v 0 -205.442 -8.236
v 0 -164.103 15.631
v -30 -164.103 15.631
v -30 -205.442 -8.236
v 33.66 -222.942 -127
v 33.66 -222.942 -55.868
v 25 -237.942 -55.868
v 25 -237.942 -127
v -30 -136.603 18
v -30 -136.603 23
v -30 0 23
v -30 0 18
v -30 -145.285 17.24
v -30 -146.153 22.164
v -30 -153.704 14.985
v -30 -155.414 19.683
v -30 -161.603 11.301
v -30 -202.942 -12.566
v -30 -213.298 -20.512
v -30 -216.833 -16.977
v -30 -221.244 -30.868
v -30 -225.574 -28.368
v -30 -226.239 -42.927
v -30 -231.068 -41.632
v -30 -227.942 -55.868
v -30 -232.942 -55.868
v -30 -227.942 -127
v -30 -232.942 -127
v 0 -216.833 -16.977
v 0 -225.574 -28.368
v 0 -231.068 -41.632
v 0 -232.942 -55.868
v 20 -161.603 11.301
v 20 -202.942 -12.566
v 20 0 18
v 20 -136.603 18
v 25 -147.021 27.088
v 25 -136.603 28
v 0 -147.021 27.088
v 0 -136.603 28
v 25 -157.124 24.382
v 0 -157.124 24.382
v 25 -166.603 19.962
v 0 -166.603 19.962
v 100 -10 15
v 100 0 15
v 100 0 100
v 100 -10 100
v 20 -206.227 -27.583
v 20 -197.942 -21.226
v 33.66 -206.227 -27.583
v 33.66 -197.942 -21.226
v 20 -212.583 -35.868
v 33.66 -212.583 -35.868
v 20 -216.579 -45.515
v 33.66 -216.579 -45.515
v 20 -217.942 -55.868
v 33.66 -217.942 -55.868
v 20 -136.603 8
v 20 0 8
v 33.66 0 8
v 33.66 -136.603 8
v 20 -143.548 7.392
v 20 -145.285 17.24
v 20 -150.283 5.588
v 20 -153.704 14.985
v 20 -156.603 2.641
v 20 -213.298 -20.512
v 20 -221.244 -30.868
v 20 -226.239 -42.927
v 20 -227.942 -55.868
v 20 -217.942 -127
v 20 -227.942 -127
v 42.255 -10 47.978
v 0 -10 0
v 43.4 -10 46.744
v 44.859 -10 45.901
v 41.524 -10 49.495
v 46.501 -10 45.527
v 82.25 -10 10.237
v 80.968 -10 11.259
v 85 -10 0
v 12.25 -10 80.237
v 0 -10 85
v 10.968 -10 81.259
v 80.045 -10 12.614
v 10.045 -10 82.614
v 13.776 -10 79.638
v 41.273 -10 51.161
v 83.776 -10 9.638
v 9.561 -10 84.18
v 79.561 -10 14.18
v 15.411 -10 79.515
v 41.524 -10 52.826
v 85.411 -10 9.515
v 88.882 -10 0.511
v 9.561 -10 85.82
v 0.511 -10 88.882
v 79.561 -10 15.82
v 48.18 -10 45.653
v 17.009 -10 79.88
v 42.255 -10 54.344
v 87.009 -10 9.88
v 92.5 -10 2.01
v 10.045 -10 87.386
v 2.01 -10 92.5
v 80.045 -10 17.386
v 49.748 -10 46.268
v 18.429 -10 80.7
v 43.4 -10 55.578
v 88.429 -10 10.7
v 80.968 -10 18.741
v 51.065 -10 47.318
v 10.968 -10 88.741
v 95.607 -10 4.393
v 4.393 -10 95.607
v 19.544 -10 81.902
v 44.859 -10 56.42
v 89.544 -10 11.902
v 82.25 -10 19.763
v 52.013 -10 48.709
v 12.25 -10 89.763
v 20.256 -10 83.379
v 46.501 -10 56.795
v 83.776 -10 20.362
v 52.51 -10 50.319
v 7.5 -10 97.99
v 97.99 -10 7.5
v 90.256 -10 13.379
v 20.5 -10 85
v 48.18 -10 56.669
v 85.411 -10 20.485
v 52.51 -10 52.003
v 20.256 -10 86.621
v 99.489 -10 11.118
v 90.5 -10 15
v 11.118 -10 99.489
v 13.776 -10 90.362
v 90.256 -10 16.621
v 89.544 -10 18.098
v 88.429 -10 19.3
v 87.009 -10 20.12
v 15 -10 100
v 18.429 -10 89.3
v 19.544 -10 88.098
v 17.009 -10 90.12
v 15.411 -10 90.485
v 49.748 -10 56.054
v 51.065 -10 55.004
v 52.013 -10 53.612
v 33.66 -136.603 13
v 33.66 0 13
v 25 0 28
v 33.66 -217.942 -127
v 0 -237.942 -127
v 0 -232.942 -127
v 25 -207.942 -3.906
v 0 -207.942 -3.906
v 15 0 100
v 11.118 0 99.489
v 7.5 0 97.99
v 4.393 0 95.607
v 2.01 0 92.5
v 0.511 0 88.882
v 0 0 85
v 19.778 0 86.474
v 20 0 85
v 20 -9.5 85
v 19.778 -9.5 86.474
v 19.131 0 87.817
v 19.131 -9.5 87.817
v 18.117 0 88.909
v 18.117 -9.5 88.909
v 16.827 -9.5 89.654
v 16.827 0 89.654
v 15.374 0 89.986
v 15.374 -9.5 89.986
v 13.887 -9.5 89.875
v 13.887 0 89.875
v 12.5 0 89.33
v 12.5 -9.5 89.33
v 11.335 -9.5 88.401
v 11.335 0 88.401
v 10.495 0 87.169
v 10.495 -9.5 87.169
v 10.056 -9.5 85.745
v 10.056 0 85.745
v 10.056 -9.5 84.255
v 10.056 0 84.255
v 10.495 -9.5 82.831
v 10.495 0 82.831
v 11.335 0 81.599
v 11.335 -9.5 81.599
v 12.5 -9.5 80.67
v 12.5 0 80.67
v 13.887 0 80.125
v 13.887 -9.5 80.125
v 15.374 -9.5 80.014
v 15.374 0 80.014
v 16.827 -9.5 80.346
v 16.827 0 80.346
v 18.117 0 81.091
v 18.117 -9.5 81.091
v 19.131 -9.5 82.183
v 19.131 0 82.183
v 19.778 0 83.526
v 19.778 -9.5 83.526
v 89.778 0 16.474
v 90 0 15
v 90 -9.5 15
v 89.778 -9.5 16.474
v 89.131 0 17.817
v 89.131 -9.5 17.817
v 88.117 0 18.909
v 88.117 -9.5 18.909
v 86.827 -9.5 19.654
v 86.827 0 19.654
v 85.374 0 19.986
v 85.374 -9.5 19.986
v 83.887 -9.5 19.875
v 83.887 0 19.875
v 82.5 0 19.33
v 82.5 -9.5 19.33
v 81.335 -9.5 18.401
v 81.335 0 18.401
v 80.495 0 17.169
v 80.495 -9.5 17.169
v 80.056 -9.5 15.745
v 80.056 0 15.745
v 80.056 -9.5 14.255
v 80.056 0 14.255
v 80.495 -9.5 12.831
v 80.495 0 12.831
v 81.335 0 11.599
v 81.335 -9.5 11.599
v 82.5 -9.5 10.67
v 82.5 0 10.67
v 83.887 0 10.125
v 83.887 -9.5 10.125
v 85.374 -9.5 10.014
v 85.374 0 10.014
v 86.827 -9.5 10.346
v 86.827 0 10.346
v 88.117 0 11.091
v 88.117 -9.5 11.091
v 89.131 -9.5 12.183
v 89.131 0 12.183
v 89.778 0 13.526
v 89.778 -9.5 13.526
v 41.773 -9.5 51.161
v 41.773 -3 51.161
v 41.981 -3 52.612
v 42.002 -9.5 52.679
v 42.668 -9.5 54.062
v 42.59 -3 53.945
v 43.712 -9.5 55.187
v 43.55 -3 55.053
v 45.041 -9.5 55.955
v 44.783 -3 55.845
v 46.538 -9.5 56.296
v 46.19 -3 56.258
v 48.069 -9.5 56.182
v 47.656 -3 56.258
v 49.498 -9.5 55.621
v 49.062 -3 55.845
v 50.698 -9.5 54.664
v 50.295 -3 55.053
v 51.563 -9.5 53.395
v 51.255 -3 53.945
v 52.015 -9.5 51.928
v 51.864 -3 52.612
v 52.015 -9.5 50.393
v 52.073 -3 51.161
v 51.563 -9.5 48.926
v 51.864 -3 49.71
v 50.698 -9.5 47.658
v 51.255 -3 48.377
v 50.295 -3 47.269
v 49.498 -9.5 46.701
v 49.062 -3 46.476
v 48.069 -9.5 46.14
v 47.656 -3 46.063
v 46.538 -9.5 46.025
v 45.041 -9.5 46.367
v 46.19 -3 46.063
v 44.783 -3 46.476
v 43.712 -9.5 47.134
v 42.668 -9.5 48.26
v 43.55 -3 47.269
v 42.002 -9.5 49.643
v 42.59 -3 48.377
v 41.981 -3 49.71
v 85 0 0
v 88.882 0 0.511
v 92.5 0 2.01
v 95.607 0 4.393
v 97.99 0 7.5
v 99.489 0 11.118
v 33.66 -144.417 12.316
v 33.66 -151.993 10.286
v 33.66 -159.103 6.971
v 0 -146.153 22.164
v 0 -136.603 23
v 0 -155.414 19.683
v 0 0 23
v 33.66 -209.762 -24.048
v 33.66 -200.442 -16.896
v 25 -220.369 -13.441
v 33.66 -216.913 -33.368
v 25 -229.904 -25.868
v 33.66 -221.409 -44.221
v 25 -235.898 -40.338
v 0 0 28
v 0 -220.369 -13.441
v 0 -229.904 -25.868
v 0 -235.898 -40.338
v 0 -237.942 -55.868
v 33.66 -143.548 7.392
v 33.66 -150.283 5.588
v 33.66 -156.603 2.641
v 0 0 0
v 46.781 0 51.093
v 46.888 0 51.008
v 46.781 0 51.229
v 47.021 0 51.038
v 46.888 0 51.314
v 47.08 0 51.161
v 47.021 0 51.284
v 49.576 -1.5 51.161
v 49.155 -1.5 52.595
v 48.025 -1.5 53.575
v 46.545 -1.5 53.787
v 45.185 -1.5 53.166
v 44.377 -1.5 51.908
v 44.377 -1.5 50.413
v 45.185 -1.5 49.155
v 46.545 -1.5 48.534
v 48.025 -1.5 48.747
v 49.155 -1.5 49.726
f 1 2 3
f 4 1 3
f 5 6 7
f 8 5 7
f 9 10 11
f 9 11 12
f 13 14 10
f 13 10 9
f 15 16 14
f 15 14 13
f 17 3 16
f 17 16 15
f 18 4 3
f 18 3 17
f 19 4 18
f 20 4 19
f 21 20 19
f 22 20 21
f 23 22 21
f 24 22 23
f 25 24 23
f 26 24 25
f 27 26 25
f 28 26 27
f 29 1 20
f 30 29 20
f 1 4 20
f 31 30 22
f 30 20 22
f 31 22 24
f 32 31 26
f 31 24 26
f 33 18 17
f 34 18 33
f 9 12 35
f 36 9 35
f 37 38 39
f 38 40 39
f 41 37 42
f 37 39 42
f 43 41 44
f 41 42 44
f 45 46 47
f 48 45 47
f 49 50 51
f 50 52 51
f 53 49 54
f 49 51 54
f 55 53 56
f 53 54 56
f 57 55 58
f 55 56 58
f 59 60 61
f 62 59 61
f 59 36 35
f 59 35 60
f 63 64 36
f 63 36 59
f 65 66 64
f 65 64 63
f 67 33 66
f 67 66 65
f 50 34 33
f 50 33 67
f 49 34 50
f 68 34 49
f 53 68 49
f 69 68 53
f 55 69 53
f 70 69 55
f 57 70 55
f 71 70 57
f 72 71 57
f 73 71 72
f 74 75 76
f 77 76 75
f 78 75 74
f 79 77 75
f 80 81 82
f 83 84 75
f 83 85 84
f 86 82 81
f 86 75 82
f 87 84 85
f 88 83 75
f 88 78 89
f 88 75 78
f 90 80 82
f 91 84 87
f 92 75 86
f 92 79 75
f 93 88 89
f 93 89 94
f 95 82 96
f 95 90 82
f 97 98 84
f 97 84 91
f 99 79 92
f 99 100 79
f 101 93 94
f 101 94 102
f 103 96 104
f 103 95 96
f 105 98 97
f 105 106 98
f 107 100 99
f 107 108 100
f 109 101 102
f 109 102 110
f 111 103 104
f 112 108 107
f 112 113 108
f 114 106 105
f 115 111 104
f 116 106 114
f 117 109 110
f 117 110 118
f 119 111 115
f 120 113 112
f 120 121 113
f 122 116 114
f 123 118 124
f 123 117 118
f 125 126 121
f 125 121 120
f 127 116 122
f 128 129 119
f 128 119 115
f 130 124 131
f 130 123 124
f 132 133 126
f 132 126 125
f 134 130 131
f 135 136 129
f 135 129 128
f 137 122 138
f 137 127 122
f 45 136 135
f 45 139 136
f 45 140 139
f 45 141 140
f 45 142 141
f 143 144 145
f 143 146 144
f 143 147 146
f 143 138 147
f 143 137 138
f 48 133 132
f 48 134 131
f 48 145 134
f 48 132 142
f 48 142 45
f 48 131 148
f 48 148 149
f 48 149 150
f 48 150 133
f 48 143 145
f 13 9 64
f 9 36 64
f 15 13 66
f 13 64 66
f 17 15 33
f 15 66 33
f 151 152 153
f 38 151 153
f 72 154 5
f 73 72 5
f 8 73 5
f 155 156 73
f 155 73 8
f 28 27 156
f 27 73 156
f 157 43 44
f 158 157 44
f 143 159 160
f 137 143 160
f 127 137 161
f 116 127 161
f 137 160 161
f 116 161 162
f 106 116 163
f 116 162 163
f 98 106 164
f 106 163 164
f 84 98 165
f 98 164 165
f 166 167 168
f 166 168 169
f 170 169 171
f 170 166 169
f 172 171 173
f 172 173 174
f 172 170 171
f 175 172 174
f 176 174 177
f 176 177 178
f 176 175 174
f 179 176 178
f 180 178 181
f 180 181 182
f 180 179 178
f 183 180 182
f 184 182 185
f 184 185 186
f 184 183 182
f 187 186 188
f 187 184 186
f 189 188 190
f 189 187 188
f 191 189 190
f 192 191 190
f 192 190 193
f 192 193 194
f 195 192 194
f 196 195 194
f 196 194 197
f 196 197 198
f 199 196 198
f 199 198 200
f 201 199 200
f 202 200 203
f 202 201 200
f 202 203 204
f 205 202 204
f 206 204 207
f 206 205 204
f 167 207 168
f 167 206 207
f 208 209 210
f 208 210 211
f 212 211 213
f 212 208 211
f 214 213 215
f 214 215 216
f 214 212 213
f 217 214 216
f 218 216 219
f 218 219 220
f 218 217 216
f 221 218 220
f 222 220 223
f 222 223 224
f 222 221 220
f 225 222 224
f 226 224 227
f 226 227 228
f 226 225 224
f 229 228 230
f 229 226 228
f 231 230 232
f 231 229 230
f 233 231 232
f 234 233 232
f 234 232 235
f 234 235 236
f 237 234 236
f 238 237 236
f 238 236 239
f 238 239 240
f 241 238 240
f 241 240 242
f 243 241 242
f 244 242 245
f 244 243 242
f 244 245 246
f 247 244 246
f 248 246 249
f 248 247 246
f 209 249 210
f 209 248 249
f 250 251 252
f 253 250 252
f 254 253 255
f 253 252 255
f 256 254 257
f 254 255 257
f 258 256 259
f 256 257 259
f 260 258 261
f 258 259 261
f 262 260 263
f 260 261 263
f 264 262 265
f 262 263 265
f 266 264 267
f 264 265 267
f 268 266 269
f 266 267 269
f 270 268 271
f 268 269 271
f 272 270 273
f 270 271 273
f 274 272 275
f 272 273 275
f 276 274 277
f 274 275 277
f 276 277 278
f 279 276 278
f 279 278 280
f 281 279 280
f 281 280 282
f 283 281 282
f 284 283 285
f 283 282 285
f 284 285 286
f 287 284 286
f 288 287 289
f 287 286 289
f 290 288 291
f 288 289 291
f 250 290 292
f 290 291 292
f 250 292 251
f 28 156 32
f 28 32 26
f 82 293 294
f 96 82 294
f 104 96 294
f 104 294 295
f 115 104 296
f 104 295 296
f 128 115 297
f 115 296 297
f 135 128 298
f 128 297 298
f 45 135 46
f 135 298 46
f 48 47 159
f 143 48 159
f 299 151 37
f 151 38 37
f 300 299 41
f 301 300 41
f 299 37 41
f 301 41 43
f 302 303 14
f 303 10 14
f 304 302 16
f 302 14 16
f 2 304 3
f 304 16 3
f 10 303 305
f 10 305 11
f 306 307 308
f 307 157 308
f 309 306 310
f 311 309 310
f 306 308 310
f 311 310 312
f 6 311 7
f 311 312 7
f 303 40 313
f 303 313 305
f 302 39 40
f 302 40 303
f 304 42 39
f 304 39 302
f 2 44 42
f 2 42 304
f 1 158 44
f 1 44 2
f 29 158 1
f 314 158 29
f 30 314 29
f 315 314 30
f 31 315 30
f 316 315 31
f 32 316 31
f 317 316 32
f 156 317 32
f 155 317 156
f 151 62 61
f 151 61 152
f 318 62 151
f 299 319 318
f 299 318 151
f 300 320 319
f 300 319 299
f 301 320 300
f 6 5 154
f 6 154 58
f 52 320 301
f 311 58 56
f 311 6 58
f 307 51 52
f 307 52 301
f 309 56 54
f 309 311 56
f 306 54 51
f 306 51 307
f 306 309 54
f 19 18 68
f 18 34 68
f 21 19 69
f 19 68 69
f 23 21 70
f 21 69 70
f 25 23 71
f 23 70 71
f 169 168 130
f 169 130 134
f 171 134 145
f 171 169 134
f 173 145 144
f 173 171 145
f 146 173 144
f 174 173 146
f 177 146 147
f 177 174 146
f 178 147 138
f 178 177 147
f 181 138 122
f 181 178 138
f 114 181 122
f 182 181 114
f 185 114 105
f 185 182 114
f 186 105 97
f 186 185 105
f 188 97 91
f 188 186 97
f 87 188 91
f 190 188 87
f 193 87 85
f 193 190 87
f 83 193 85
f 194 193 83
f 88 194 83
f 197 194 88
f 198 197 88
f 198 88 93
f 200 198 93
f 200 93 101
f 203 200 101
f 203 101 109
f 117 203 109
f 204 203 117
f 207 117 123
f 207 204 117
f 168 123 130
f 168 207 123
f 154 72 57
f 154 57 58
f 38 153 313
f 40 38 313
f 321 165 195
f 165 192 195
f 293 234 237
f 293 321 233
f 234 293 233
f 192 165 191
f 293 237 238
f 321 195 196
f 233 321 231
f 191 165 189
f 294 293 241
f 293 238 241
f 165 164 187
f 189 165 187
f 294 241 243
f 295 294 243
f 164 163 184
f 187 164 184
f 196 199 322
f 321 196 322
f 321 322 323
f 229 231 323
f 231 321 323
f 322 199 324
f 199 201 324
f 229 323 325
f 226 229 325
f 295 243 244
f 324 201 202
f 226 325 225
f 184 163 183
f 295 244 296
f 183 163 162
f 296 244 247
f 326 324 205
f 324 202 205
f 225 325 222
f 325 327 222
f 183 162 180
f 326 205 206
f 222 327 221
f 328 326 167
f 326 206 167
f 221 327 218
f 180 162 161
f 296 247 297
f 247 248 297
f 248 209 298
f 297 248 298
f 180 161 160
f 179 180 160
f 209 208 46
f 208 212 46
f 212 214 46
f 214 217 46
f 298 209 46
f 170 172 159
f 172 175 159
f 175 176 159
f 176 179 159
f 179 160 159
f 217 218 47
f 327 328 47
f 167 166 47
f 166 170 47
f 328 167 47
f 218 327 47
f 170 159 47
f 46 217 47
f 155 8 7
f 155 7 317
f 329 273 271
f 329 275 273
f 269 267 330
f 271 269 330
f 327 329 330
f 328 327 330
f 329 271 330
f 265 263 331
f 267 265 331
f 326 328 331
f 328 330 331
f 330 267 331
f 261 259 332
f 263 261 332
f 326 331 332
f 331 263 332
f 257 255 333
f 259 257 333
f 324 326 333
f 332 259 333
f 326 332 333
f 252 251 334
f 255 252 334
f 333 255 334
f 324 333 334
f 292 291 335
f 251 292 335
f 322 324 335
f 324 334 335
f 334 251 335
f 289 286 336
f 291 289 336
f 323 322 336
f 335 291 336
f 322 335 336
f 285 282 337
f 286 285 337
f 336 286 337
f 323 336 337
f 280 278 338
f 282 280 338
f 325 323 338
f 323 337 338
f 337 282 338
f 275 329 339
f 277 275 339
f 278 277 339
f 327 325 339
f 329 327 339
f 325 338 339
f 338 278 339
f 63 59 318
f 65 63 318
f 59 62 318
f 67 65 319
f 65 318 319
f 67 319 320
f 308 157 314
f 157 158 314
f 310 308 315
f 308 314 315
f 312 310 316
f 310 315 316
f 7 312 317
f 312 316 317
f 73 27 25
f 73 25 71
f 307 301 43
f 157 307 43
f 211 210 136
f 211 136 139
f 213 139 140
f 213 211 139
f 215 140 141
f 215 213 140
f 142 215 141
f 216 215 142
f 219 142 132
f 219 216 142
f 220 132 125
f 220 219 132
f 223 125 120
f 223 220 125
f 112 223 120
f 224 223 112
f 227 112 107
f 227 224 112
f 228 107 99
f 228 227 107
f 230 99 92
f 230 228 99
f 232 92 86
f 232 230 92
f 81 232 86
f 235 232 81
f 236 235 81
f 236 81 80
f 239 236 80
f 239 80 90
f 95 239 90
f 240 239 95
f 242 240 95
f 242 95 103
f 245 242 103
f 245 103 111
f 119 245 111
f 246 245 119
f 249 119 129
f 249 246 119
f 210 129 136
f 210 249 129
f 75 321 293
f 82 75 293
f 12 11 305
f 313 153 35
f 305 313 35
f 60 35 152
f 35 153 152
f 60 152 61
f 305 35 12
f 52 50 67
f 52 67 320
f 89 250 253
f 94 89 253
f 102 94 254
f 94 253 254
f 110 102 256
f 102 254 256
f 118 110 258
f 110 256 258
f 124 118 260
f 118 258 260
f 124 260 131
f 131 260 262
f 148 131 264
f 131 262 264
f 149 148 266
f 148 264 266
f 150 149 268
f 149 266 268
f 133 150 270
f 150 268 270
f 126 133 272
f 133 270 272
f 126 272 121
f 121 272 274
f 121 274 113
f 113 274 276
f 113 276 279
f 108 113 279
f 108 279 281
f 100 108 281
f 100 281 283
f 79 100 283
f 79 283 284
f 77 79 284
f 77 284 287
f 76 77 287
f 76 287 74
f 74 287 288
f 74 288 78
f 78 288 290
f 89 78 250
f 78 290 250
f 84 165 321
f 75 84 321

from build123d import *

# Parameters (mm, degrees)
F0_R     = 5
F1_DEPTH = 10
F3_D     = 10.3
F3_DEPTH = 7
F3_TIP   = 3.094432188
F4_SIZE  = 0.5


with BuildPart() as f1:
    # F0 (on Front) → F1 (new body)
    with BuildSketch(Plane.XZ):
        with BuildLine():
            Line((0, 85), (0, 0))
            Line((0, 0), (85, 0))
            ThreePointArc((85, 0), (95.6066017178, 4.3933982822), (100, 15))
            Line((100, 15), (100, 100))
            Line((100, 100), (15, 100))
            ThreePointArc((15, 100), (4.3933982822, 95.6066017178), (0, 85))
        make_face()
        with Locations((85, 15)):
            Circle(F0_R, mode=Mode.SUBTRACT)
        with Locations((15, 85)):
            Circle(F0_R, mode=Mode.SUBTRACT)
    extrude(amount=F1_DEPTH)

    # F3
    with Locations(Plane.XZ.offset(10)):
        with Locations((46.9228513539, 51.1608496308)):
            Hole(F3_D / 2, depth=F3_DEPTH)
            with Locations((0, 0, -(F3_DEPTH + F3_TIP / 2))):  # 118° drill point
                Cone(0, F3_D / 2, F3_TIP, mode=Mode.SUBTRACT)

    # F4
    f4_edges = [f1.edges().sort_by_distance(p)[0] for p in [
        (10, -10, 85),
        (80, -10, 15),
        (41.772851, -10, 51.16085),
    ]]
    chamfer(f4_edges, length=F4_SIZE)


with BuildPart() as f7:
    # F7: sweep along a path in F6
    with BuildLine(Plane.YZ) as f7_path:
        Line((0, 18), (-136.6025403784, 18))
        ThreePointArc((-136.6025403784, 18), (-149.5434926336, 16.2962913145), (-161.6025403784, 11.3012701892))
        Line((-161.6025403784, 11.3012701892), (-202.9422863406, -12.5662432703))
        ThreePointArc((-202.9422863406, -12.5662432703), (-221.2435565298, -30.8675134595), (-227.9422863406, -55.8675134595))
        Line((-227.9422863406, -55.8675134595), (-227.9422863406, -127))
    # F5 (on Front) → F7 (sweep)
    with BuildSketch(Plane.XZ):
        Polygon((-30, 23), (-30, 18), (20, 18), (20, 8), (33.6602540378, 8), (33.6602540378, 13), (25, 28), (0, 28), (0, 23), align=None)
    sweep(path=f7_path.line)


solid = Compound([f1.part, f7.part])
